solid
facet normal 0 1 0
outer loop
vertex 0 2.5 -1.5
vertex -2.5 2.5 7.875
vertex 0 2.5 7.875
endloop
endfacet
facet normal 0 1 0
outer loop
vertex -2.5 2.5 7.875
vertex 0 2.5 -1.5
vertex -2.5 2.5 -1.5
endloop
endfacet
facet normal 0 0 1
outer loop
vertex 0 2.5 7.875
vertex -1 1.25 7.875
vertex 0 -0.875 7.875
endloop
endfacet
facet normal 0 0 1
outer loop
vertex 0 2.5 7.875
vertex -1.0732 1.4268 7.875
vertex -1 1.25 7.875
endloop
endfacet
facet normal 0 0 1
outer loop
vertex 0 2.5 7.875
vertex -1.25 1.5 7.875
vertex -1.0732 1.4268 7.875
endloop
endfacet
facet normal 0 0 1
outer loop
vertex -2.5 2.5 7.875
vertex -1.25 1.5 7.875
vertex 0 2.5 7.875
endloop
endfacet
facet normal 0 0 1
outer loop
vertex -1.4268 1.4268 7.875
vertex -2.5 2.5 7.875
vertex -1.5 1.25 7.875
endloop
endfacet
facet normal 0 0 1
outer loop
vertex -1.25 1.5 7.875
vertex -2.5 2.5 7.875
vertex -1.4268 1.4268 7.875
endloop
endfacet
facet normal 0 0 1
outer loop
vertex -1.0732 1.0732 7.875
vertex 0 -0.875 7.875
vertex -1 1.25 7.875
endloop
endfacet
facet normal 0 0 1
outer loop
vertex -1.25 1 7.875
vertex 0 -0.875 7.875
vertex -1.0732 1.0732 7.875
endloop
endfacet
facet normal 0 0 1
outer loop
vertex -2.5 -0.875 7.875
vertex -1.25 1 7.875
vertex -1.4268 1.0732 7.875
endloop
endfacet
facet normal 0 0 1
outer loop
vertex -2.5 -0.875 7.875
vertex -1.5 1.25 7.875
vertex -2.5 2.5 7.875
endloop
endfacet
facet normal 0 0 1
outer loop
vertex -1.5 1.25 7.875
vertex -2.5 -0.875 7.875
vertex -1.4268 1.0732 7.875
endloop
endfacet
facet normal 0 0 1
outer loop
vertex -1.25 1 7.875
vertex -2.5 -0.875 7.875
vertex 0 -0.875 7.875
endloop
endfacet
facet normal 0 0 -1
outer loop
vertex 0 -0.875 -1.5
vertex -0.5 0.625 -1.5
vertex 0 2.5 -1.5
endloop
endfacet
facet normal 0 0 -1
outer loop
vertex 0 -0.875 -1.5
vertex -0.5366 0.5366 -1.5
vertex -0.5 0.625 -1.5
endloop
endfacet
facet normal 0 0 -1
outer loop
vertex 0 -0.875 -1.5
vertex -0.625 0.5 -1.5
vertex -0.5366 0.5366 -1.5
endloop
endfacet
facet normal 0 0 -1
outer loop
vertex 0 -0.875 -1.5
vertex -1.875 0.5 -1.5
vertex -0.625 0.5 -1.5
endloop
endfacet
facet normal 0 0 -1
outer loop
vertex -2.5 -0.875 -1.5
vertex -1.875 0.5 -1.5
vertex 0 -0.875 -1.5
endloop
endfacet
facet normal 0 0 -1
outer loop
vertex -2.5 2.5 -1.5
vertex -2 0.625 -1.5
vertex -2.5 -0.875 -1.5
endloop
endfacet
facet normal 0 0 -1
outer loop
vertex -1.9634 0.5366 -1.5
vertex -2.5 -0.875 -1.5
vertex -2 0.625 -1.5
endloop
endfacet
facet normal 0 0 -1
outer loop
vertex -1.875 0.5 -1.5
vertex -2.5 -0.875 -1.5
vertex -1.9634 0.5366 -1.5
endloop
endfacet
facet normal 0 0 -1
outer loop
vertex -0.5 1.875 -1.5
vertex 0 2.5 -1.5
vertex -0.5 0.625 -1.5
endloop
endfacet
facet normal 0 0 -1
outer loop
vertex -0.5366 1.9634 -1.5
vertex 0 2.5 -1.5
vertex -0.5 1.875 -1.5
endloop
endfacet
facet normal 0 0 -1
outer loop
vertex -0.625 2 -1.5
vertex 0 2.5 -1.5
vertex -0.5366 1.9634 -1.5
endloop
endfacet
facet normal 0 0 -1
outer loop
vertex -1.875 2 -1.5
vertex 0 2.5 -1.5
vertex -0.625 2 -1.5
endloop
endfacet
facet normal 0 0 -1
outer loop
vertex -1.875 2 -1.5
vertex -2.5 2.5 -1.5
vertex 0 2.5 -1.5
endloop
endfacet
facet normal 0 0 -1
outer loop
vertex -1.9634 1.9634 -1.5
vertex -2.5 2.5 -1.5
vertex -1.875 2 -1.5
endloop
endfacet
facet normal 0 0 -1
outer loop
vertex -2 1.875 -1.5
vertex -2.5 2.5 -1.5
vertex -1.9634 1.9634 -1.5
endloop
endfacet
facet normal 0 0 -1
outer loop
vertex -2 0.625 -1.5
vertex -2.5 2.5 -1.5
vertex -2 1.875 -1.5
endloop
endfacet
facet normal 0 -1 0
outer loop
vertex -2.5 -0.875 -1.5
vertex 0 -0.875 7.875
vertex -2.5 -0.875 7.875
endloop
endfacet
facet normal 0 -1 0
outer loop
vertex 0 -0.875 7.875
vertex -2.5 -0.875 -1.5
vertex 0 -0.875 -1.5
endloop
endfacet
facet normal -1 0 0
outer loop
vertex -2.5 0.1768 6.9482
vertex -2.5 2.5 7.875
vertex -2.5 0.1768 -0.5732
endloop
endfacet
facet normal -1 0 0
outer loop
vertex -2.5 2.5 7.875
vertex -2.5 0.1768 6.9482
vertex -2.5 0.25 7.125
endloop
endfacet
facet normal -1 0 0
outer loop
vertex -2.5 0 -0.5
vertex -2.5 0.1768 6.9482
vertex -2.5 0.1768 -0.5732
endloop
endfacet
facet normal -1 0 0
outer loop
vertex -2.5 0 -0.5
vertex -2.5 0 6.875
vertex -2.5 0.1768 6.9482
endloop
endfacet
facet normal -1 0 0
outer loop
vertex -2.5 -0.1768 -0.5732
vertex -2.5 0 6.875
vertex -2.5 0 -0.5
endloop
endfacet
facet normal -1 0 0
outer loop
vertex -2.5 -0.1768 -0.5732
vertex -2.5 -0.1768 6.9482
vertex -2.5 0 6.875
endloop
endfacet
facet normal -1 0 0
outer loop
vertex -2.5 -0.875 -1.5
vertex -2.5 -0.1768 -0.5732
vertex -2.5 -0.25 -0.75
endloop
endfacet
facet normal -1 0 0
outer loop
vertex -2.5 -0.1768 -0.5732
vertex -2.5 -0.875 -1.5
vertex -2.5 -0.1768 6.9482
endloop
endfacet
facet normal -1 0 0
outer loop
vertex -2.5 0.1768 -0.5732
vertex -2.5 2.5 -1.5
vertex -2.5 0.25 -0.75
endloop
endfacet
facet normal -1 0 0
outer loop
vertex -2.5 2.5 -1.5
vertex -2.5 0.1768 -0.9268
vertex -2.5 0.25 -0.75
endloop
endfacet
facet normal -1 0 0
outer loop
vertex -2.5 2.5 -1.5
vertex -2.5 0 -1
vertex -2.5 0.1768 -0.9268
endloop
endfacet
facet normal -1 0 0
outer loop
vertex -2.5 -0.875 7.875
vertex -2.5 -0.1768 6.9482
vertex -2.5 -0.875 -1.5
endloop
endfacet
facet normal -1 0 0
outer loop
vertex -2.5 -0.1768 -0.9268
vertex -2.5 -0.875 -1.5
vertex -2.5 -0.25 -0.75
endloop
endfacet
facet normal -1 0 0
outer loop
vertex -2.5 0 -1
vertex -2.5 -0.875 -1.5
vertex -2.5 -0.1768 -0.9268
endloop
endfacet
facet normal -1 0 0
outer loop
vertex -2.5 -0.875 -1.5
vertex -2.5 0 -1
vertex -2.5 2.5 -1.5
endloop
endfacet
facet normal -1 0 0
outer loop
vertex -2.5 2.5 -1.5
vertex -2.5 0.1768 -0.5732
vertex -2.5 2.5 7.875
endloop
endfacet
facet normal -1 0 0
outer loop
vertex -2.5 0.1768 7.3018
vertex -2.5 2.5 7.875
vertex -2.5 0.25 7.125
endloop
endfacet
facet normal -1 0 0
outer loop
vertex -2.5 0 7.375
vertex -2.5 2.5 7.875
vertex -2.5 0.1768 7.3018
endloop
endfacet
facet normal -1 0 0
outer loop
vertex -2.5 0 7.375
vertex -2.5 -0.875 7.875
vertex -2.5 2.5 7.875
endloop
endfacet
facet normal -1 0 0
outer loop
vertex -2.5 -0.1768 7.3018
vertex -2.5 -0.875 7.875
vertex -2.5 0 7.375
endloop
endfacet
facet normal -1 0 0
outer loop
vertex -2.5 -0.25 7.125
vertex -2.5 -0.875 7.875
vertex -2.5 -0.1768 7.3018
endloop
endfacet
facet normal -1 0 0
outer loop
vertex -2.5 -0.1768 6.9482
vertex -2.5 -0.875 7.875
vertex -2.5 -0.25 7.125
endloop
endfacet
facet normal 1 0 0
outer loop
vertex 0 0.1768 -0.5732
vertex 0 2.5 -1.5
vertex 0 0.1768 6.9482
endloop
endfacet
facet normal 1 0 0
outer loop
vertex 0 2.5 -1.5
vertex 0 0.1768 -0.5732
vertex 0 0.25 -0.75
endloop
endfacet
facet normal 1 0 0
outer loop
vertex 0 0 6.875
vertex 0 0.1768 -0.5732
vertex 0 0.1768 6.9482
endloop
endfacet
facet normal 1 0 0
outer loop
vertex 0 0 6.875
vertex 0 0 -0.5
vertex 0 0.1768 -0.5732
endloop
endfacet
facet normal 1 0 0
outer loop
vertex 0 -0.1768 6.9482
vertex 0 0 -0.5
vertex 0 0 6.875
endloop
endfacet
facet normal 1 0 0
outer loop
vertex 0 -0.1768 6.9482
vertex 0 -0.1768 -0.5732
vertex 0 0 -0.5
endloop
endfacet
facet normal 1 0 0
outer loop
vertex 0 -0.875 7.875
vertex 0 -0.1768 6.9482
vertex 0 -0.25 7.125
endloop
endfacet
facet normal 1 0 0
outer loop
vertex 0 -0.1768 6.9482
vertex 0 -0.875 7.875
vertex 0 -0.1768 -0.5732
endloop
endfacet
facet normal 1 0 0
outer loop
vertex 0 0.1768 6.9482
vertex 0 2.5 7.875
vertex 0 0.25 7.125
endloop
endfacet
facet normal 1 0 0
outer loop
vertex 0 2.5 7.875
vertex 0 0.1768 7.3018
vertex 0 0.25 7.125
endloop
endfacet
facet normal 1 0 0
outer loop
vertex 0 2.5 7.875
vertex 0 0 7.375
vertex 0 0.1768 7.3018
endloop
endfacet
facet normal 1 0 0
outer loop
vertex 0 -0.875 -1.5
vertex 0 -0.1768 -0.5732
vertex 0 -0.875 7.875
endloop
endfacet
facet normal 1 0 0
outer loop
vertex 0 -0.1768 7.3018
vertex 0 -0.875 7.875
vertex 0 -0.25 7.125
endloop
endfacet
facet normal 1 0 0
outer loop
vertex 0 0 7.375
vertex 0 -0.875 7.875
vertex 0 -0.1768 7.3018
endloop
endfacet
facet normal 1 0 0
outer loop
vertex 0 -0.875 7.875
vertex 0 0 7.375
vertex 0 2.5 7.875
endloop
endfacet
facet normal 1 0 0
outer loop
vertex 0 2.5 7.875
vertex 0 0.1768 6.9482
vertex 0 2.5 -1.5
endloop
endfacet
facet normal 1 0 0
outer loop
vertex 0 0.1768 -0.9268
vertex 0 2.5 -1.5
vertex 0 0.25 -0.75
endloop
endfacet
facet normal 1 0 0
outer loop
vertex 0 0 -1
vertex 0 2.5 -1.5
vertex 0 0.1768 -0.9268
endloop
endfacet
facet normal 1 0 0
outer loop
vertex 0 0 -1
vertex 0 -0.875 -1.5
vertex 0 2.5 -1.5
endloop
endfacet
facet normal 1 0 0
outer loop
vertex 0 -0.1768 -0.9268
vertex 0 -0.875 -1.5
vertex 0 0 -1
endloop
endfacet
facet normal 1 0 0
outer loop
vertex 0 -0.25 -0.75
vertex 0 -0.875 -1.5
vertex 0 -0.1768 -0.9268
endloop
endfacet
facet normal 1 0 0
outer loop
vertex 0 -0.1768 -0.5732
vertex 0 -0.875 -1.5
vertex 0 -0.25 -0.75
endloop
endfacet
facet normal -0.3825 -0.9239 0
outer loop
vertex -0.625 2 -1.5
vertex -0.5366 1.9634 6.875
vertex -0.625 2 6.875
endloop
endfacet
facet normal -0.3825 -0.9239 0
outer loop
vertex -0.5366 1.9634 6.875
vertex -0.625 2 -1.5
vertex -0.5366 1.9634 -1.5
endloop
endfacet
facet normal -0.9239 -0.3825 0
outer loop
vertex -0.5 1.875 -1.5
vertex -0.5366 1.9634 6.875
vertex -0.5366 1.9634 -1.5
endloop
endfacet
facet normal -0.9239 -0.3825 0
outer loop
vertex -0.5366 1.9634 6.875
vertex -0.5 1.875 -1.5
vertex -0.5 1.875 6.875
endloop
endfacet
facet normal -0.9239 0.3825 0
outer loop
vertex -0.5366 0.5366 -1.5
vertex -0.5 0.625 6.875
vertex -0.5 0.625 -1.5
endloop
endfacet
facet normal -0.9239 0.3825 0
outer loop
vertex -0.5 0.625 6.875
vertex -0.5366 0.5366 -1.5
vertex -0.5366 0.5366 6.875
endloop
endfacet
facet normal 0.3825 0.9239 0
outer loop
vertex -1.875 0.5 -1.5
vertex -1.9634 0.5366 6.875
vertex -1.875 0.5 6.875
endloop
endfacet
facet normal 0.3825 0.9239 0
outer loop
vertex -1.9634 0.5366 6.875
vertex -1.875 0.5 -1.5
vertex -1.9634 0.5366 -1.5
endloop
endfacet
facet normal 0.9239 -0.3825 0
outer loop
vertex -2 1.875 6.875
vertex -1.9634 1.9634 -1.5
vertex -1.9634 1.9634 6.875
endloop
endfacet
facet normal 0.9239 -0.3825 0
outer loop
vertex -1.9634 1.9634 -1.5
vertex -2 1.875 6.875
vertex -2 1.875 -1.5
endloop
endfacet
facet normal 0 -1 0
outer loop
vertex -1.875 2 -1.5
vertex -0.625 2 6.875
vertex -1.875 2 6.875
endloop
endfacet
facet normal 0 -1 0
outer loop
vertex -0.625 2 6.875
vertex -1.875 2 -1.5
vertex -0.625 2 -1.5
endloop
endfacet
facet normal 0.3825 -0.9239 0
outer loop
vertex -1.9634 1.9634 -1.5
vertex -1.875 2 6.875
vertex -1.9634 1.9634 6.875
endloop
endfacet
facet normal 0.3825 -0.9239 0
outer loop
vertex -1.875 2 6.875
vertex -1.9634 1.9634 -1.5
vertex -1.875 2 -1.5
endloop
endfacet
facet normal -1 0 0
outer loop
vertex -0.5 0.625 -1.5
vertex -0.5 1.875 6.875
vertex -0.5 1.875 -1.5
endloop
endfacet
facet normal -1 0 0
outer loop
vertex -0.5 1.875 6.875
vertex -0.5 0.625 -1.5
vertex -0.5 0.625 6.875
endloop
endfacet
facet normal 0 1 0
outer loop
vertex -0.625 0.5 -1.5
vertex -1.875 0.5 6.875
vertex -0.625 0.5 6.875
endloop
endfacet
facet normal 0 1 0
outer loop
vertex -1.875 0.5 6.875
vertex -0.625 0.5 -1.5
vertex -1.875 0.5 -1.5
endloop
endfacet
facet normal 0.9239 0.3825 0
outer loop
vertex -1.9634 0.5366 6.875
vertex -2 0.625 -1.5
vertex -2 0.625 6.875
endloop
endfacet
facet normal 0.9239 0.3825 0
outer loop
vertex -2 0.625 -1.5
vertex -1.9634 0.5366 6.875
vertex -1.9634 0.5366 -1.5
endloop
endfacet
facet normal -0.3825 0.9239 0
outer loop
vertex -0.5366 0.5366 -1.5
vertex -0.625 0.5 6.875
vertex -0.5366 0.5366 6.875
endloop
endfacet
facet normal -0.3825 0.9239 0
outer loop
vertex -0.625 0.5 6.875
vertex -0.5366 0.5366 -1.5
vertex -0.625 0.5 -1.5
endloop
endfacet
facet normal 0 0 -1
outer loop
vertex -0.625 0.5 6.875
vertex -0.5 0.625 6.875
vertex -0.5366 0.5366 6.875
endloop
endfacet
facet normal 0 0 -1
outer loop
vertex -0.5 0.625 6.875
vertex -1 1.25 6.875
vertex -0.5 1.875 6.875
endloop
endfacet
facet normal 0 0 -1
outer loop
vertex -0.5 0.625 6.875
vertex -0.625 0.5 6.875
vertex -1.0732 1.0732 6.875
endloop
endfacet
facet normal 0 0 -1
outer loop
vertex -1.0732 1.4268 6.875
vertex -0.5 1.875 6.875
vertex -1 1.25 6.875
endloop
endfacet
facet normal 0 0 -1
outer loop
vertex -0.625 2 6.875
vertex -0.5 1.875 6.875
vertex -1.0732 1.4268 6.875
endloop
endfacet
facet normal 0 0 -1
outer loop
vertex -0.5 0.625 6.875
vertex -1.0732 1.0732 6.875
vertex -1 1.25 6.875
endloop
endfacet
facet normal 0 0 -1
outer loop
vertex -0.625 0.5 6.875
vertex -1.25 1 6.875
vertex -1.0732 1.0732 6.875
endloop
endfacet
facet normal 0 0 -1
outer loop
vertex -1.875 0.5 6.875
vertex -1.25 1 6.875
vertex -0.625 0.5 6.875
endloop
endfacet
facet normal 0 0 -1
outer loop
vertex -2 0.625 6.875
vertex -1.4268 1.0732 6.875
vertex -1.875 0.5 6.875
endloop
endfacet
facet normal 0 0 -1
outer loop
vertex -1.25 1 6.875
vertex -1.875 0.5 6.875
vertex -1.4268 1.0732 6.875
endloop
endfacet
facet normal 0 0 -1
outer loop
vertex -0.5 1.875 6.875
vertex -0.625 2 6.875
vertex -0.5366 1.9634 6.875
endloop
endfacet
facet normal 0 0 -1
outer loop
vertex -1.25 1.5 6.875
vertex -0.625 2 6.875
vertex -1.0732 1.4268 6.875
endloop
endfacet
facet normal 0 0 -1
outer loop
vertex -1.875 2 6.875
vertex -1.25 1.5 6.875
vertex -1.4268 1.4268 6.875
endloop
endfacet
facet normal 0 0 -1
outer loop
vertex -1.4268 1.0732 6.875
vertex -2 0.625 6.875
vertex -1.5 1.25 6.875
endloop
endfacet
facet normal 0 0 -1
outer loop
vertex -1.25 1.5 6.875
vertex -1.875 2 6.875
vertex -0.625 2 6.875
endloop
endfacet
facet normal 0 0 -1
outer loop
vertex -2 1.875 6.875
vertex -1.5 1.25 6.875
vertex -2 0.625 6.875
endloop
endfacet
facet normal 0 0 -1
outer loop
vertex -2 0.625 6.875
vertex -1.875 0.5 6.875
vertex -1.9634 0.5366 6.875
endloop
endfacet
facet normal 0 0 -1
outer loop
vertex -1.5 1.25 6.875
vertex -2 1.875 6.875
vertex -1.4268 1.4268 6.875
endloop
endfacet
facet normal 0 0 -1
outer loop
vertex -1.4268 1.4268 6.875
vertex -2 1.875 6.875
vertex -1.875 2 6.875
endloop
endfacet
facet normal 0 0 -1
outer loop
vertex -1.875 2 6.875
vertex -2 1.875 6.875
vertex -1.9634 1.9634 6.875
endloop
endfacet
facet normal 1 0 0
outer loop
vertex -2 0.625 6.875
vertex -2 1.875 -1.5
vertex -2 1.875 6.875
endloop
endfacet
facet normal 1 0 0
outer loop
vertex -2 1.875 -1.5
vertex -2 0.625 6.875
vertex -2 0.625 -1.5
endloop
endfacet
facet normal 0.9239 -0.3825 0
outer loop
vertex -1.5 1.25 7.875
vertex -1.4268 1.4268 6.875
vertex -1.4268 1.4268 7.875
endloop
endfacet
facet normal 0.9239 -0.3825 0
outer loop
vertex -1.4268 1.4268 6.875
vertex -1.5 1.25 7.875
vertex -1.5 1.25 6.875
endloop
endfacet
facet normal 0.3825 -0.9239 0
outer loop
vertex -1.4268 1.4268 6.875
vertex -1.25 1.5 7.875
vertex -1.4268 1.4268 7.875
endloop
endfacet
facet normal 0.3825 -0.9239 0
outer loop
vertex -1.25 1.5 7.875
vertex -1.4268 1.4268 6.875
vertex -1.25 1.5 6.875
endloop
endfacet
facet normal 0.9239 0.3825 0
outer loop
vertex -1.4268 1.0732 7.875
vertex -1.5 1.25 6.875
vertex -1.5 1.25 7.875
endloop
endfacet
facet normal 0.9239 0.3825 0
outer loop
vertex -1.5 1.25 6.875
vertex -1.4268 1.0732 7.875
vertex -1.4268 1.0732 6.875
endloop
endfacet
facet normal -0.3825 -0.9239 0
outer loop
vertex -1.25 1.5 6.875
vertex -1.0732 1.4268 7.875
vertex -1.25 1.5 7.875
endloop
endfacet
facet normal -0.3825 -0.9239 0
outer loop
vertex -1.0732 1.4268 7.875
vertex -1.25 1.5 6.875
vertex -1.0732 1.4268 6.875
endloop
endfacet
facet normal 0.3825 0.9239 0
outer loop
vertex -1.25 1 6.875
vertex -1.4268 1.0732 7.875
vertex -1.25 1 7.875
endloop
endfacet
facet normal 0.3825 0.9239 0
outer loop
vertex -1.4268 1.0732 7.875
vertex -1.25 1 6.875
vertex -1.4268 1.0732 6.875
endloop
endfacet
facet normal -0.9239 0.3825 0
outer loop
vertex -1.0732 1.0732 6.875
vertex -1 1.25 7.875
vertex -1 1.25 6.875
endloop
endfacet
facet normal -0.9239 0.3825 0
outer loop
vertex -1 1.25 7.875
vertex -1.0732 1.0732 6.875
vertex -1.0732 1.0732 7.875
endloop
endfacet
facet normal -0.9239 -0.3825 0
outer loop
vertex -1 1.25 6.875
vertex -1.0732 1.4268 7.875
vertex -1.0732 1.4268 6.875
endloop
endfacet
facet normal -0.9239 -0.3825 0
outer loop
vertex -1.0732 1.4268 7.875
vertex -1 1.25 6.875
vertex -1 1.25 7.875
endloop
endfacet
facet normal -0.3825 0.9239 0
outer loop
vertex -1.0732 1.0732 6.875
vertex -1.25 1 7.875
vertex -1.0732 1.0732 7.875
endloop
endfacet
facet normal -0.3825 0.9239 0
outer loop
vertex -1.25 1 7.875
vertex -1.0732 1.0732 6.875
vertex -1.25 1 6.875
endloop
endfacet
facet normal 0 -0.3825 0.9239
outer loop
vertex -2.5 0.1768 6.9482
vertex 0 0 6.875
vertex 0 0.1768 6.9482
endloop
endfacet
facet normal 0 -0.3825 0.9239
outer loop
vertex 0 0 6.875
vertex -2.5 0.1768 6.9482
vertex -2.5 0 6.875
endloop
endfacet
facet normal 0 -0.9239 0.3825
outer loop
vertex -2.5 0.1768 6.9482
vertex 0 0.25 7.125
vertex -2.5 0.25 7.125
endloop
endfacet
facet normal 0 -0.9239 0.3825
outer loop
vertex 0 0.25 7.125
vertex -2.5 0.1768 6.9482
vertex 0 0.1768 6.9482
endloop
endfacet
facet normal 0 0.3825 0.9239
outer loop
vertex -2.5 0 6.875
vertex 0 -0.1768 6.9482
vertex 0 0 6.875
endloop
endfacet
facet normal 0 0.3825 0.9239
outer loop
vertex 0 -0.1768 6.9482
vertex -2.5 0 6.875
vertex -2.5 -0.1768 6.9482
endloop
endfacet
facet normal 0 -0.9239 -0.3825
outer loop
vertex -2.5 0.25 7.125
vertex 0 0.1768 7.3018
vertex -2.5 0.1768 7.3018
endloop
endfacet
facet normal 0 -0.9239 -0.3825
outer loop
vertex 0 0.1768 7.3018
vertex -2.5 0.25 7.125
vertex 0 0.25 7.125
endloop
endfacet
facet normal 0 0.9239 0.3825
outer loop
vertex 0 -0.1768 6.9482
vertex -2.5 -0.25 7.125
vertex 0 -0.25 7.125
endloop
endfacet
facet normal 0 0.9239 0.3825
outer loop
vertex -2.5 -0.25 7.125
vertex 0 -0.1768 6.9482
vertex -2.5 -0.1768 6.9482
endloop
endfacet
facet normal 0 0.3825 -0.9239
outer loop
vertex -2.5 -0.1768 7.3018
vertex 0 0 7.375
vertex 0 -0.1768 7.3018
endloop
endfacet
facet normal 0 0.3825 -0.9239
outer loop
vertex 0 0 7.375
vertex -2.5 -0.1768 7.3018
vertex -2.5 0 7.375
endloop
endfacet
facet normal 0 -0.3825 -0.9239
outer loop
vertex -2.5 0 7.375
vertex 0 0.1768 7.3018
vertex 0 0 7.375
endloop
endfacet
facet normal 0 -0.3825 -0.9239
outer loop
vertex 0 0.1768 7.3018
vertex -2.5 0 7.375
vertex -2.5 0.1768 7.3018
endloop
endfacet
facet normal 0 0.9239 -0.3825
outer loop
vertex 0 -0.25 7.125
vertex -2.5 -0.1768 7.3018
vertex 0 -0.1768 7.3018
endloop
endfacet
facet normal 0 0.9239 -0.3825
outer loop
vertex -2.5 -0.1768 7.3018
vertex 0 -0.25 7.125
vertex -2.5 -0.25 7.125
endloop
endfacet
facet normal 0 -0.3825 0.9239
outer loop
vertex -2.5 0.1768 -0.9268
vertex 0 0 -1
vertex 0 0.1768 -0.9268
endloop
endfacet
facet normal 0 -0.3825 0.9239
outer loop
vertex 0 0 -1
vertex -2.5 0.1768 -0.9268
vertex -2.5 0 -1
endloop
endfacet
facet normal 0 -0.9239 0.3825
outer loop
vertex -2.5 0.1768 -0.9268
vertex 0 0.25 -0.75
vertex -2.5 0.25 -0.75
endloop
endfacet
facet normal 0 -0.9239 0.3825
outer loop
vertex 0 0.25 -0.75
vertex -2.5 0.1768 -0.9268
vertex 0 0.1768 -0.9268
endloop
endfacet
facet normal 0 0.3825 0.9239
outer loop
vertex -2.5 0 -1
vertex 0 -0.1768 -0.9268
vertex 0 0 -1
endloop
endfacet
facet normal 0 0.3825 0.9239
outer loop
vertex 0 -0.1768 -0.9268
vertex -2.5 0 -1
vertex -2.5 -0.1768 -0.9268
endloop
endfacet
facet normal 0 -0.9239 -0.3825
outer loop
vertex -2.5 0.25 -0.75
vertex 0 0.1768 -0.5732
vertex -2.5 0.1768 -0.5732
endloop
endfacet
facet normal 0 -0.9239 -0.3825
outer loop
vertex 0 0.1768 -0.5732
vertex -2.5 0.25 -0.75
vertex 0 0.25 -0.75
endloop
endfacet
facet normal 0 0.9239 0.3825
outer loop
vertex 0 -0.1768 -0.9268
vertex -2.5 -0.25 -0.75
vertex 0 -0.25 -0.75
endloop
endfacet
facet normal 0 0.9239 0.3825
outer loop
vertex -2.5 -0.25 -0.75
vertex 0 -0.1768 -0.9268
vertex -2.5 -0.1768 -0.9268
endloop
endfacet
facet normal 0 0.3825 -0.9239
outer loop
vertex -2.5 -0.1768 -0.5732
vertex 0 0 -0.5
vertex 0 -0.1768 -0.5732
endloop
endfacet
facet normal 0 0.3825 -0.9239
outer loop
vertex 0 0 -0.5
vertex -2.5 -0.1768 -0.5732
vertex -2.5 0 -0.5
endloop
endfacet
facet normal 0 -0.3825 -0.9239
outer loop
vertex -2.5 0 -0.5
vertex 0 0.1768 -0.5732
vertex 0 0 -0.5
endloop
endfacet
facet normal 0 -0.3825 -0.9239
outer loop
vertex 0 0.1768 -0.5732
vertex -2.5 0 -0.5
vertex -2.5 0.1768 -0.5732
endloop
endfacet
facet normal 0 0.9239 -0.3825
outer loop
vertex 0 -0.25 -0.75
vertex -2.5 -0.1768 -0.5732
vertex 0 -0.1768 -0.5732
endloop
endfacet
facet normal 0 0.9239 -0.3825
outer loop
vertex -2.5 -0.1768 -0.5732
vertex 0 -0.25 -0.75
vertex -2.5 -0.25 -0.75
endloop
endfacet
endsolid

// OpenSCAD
// file: TTvars.scad
$fn=8; //default 36

//flat bar
barX=0.25;
barZ=6;
barLY=108;
barLX=60;

//angle iron
angX=1.5;
angT=0.125;
angLY=barLY;
angLX=barLX;
angR=0.25;

//square tubing
cornerSQ=1.5; //size of square tubing in corners
cornerSQr=0.125; //radius of square tubing 90s
cornerT=0.5; //thickness of corner mount walls
cornerBoltOD=0.5;


boltD=0.5;      //main mounting bolt diameter
boltL=1.968504;  

brrOD=0.875;
brrID=0.375;
brrT=0.28125;

sprOD=0.25; //spring? i dont remember wha this is

bmountGap=0.125;
bmountbrrGap=0.125;

//stepper
stepBoltD=0.11811024;  //3.0mm bolt diameter
stepBoltHD=0.22362205; //5.68mm head diameter
stepBoltHH=0.11811024;  //3.0mm head height
stepBoltX=1.22047244;   //31.0mm square from bolt center to center
stepBoltIn=0.15748031;  //4.0mm bolt depth into stepper
stepSeatD=0.86614173;    //22.0mm
stepSeatH=0.07874016;    //2.0mm
stepX=1.66535433;        //42.3mm stepper square face 
stepBoreD=0.2007874;     //5.1mm shaft bore
stepBoreL=0.787402;    //20mm

//pully
pullP=1.253;       //OD of belt around pully GT2 20T ??
pullH=0.25;            //Height of pulley ?????
pullS=0.125;           //pully space

//calculated

Y2Y=barLX+0.0;
Y2YA=Y2Y+(((((barX+(bmountGap*2)))/2)+0.5)*2); //center to center barL
X2X=8; //distance between X rails

bmountX=max((barX+(bmountGap*2)+(stepX*2)),(barX+((brrOD+1)*2)));
// max(barX+(bmountGap*2)+(stepX*2),barX+((brrOD+1)*2))
bmountY=X2X;
bmountZ=barZ+(1+boltD)+(brrOD/2)+(brrID/2)+(0.25)+boltD+(0.5);

xmountX=((bmountX-(barX+(bmountGap*2)))/2)+0;
xmountY=angX+barX+1.0;
// main file
include <TTvars.scad>;

TTcorner();

module TTcorner(){    
rotate([0,0,90])
translate([-(xmountX/2)-((barX+(bmountGap*2))/2),0,-(1+boltD)])
 difference(){    
  difference(){    
  translate([(barX+(bmountGap*2))/2,0,0])
   cube([(xmountX/2)-((barX+(bmountGap*2))/2)+(boltD/2)+(cornerSQ+(cornerT*2)),cornerSQ+(cornerT*2),bmountZ]);    

//square tubing hole
  translate([(xmountX/2)+(boltD/2)+((cornerSQ-(cornerSQr*2))/2),(cornerSQ-(cornerSQr*2))/2,bmountZ-1])
  mirror([0,0,1])    
  minkowski(){
   cube([cornerSQ-(cornerSQr*2),cornerSQ-(cornerSQr*2),bmountZ]);
   cylinder(r=cornerSQr, h=1);
  }//end minkoski

//corner bolt hole
  translate([(xmountX/2)+(boltD/2)+((cornerSQ-(cornerSQr*2))),(cornerSQ-(cornerSQr*2)),bmountZ-1])
   cylinder(d=cornerBoltOD, h=1);
  }//end difference

//upper attach hole
  translate([bmountX-(((bmountX-(barX+(bmountGap*2)))/2)/2)-(bmountX/2),0,barZ+(brrOD/2)+(brrID/2)+(0.25)+(boltD/2)+(1+boltD)])
  rotate([-90,0,0])
   cylinder(d=boltD, h=(cornerSQ+(cornerT*2)));

//lower attach hole
  translate([bmountX-(((bmountX-(barX+(bmountGap*2)))/2)/2)-(bmountX/2),0,(1+boltD)/2])
  rotate([-90,0,0])
   cylinder(d=boltD, h=(cornerSQ+(cornerT*2)));
  
 } //end difference
} //end TTcorner
